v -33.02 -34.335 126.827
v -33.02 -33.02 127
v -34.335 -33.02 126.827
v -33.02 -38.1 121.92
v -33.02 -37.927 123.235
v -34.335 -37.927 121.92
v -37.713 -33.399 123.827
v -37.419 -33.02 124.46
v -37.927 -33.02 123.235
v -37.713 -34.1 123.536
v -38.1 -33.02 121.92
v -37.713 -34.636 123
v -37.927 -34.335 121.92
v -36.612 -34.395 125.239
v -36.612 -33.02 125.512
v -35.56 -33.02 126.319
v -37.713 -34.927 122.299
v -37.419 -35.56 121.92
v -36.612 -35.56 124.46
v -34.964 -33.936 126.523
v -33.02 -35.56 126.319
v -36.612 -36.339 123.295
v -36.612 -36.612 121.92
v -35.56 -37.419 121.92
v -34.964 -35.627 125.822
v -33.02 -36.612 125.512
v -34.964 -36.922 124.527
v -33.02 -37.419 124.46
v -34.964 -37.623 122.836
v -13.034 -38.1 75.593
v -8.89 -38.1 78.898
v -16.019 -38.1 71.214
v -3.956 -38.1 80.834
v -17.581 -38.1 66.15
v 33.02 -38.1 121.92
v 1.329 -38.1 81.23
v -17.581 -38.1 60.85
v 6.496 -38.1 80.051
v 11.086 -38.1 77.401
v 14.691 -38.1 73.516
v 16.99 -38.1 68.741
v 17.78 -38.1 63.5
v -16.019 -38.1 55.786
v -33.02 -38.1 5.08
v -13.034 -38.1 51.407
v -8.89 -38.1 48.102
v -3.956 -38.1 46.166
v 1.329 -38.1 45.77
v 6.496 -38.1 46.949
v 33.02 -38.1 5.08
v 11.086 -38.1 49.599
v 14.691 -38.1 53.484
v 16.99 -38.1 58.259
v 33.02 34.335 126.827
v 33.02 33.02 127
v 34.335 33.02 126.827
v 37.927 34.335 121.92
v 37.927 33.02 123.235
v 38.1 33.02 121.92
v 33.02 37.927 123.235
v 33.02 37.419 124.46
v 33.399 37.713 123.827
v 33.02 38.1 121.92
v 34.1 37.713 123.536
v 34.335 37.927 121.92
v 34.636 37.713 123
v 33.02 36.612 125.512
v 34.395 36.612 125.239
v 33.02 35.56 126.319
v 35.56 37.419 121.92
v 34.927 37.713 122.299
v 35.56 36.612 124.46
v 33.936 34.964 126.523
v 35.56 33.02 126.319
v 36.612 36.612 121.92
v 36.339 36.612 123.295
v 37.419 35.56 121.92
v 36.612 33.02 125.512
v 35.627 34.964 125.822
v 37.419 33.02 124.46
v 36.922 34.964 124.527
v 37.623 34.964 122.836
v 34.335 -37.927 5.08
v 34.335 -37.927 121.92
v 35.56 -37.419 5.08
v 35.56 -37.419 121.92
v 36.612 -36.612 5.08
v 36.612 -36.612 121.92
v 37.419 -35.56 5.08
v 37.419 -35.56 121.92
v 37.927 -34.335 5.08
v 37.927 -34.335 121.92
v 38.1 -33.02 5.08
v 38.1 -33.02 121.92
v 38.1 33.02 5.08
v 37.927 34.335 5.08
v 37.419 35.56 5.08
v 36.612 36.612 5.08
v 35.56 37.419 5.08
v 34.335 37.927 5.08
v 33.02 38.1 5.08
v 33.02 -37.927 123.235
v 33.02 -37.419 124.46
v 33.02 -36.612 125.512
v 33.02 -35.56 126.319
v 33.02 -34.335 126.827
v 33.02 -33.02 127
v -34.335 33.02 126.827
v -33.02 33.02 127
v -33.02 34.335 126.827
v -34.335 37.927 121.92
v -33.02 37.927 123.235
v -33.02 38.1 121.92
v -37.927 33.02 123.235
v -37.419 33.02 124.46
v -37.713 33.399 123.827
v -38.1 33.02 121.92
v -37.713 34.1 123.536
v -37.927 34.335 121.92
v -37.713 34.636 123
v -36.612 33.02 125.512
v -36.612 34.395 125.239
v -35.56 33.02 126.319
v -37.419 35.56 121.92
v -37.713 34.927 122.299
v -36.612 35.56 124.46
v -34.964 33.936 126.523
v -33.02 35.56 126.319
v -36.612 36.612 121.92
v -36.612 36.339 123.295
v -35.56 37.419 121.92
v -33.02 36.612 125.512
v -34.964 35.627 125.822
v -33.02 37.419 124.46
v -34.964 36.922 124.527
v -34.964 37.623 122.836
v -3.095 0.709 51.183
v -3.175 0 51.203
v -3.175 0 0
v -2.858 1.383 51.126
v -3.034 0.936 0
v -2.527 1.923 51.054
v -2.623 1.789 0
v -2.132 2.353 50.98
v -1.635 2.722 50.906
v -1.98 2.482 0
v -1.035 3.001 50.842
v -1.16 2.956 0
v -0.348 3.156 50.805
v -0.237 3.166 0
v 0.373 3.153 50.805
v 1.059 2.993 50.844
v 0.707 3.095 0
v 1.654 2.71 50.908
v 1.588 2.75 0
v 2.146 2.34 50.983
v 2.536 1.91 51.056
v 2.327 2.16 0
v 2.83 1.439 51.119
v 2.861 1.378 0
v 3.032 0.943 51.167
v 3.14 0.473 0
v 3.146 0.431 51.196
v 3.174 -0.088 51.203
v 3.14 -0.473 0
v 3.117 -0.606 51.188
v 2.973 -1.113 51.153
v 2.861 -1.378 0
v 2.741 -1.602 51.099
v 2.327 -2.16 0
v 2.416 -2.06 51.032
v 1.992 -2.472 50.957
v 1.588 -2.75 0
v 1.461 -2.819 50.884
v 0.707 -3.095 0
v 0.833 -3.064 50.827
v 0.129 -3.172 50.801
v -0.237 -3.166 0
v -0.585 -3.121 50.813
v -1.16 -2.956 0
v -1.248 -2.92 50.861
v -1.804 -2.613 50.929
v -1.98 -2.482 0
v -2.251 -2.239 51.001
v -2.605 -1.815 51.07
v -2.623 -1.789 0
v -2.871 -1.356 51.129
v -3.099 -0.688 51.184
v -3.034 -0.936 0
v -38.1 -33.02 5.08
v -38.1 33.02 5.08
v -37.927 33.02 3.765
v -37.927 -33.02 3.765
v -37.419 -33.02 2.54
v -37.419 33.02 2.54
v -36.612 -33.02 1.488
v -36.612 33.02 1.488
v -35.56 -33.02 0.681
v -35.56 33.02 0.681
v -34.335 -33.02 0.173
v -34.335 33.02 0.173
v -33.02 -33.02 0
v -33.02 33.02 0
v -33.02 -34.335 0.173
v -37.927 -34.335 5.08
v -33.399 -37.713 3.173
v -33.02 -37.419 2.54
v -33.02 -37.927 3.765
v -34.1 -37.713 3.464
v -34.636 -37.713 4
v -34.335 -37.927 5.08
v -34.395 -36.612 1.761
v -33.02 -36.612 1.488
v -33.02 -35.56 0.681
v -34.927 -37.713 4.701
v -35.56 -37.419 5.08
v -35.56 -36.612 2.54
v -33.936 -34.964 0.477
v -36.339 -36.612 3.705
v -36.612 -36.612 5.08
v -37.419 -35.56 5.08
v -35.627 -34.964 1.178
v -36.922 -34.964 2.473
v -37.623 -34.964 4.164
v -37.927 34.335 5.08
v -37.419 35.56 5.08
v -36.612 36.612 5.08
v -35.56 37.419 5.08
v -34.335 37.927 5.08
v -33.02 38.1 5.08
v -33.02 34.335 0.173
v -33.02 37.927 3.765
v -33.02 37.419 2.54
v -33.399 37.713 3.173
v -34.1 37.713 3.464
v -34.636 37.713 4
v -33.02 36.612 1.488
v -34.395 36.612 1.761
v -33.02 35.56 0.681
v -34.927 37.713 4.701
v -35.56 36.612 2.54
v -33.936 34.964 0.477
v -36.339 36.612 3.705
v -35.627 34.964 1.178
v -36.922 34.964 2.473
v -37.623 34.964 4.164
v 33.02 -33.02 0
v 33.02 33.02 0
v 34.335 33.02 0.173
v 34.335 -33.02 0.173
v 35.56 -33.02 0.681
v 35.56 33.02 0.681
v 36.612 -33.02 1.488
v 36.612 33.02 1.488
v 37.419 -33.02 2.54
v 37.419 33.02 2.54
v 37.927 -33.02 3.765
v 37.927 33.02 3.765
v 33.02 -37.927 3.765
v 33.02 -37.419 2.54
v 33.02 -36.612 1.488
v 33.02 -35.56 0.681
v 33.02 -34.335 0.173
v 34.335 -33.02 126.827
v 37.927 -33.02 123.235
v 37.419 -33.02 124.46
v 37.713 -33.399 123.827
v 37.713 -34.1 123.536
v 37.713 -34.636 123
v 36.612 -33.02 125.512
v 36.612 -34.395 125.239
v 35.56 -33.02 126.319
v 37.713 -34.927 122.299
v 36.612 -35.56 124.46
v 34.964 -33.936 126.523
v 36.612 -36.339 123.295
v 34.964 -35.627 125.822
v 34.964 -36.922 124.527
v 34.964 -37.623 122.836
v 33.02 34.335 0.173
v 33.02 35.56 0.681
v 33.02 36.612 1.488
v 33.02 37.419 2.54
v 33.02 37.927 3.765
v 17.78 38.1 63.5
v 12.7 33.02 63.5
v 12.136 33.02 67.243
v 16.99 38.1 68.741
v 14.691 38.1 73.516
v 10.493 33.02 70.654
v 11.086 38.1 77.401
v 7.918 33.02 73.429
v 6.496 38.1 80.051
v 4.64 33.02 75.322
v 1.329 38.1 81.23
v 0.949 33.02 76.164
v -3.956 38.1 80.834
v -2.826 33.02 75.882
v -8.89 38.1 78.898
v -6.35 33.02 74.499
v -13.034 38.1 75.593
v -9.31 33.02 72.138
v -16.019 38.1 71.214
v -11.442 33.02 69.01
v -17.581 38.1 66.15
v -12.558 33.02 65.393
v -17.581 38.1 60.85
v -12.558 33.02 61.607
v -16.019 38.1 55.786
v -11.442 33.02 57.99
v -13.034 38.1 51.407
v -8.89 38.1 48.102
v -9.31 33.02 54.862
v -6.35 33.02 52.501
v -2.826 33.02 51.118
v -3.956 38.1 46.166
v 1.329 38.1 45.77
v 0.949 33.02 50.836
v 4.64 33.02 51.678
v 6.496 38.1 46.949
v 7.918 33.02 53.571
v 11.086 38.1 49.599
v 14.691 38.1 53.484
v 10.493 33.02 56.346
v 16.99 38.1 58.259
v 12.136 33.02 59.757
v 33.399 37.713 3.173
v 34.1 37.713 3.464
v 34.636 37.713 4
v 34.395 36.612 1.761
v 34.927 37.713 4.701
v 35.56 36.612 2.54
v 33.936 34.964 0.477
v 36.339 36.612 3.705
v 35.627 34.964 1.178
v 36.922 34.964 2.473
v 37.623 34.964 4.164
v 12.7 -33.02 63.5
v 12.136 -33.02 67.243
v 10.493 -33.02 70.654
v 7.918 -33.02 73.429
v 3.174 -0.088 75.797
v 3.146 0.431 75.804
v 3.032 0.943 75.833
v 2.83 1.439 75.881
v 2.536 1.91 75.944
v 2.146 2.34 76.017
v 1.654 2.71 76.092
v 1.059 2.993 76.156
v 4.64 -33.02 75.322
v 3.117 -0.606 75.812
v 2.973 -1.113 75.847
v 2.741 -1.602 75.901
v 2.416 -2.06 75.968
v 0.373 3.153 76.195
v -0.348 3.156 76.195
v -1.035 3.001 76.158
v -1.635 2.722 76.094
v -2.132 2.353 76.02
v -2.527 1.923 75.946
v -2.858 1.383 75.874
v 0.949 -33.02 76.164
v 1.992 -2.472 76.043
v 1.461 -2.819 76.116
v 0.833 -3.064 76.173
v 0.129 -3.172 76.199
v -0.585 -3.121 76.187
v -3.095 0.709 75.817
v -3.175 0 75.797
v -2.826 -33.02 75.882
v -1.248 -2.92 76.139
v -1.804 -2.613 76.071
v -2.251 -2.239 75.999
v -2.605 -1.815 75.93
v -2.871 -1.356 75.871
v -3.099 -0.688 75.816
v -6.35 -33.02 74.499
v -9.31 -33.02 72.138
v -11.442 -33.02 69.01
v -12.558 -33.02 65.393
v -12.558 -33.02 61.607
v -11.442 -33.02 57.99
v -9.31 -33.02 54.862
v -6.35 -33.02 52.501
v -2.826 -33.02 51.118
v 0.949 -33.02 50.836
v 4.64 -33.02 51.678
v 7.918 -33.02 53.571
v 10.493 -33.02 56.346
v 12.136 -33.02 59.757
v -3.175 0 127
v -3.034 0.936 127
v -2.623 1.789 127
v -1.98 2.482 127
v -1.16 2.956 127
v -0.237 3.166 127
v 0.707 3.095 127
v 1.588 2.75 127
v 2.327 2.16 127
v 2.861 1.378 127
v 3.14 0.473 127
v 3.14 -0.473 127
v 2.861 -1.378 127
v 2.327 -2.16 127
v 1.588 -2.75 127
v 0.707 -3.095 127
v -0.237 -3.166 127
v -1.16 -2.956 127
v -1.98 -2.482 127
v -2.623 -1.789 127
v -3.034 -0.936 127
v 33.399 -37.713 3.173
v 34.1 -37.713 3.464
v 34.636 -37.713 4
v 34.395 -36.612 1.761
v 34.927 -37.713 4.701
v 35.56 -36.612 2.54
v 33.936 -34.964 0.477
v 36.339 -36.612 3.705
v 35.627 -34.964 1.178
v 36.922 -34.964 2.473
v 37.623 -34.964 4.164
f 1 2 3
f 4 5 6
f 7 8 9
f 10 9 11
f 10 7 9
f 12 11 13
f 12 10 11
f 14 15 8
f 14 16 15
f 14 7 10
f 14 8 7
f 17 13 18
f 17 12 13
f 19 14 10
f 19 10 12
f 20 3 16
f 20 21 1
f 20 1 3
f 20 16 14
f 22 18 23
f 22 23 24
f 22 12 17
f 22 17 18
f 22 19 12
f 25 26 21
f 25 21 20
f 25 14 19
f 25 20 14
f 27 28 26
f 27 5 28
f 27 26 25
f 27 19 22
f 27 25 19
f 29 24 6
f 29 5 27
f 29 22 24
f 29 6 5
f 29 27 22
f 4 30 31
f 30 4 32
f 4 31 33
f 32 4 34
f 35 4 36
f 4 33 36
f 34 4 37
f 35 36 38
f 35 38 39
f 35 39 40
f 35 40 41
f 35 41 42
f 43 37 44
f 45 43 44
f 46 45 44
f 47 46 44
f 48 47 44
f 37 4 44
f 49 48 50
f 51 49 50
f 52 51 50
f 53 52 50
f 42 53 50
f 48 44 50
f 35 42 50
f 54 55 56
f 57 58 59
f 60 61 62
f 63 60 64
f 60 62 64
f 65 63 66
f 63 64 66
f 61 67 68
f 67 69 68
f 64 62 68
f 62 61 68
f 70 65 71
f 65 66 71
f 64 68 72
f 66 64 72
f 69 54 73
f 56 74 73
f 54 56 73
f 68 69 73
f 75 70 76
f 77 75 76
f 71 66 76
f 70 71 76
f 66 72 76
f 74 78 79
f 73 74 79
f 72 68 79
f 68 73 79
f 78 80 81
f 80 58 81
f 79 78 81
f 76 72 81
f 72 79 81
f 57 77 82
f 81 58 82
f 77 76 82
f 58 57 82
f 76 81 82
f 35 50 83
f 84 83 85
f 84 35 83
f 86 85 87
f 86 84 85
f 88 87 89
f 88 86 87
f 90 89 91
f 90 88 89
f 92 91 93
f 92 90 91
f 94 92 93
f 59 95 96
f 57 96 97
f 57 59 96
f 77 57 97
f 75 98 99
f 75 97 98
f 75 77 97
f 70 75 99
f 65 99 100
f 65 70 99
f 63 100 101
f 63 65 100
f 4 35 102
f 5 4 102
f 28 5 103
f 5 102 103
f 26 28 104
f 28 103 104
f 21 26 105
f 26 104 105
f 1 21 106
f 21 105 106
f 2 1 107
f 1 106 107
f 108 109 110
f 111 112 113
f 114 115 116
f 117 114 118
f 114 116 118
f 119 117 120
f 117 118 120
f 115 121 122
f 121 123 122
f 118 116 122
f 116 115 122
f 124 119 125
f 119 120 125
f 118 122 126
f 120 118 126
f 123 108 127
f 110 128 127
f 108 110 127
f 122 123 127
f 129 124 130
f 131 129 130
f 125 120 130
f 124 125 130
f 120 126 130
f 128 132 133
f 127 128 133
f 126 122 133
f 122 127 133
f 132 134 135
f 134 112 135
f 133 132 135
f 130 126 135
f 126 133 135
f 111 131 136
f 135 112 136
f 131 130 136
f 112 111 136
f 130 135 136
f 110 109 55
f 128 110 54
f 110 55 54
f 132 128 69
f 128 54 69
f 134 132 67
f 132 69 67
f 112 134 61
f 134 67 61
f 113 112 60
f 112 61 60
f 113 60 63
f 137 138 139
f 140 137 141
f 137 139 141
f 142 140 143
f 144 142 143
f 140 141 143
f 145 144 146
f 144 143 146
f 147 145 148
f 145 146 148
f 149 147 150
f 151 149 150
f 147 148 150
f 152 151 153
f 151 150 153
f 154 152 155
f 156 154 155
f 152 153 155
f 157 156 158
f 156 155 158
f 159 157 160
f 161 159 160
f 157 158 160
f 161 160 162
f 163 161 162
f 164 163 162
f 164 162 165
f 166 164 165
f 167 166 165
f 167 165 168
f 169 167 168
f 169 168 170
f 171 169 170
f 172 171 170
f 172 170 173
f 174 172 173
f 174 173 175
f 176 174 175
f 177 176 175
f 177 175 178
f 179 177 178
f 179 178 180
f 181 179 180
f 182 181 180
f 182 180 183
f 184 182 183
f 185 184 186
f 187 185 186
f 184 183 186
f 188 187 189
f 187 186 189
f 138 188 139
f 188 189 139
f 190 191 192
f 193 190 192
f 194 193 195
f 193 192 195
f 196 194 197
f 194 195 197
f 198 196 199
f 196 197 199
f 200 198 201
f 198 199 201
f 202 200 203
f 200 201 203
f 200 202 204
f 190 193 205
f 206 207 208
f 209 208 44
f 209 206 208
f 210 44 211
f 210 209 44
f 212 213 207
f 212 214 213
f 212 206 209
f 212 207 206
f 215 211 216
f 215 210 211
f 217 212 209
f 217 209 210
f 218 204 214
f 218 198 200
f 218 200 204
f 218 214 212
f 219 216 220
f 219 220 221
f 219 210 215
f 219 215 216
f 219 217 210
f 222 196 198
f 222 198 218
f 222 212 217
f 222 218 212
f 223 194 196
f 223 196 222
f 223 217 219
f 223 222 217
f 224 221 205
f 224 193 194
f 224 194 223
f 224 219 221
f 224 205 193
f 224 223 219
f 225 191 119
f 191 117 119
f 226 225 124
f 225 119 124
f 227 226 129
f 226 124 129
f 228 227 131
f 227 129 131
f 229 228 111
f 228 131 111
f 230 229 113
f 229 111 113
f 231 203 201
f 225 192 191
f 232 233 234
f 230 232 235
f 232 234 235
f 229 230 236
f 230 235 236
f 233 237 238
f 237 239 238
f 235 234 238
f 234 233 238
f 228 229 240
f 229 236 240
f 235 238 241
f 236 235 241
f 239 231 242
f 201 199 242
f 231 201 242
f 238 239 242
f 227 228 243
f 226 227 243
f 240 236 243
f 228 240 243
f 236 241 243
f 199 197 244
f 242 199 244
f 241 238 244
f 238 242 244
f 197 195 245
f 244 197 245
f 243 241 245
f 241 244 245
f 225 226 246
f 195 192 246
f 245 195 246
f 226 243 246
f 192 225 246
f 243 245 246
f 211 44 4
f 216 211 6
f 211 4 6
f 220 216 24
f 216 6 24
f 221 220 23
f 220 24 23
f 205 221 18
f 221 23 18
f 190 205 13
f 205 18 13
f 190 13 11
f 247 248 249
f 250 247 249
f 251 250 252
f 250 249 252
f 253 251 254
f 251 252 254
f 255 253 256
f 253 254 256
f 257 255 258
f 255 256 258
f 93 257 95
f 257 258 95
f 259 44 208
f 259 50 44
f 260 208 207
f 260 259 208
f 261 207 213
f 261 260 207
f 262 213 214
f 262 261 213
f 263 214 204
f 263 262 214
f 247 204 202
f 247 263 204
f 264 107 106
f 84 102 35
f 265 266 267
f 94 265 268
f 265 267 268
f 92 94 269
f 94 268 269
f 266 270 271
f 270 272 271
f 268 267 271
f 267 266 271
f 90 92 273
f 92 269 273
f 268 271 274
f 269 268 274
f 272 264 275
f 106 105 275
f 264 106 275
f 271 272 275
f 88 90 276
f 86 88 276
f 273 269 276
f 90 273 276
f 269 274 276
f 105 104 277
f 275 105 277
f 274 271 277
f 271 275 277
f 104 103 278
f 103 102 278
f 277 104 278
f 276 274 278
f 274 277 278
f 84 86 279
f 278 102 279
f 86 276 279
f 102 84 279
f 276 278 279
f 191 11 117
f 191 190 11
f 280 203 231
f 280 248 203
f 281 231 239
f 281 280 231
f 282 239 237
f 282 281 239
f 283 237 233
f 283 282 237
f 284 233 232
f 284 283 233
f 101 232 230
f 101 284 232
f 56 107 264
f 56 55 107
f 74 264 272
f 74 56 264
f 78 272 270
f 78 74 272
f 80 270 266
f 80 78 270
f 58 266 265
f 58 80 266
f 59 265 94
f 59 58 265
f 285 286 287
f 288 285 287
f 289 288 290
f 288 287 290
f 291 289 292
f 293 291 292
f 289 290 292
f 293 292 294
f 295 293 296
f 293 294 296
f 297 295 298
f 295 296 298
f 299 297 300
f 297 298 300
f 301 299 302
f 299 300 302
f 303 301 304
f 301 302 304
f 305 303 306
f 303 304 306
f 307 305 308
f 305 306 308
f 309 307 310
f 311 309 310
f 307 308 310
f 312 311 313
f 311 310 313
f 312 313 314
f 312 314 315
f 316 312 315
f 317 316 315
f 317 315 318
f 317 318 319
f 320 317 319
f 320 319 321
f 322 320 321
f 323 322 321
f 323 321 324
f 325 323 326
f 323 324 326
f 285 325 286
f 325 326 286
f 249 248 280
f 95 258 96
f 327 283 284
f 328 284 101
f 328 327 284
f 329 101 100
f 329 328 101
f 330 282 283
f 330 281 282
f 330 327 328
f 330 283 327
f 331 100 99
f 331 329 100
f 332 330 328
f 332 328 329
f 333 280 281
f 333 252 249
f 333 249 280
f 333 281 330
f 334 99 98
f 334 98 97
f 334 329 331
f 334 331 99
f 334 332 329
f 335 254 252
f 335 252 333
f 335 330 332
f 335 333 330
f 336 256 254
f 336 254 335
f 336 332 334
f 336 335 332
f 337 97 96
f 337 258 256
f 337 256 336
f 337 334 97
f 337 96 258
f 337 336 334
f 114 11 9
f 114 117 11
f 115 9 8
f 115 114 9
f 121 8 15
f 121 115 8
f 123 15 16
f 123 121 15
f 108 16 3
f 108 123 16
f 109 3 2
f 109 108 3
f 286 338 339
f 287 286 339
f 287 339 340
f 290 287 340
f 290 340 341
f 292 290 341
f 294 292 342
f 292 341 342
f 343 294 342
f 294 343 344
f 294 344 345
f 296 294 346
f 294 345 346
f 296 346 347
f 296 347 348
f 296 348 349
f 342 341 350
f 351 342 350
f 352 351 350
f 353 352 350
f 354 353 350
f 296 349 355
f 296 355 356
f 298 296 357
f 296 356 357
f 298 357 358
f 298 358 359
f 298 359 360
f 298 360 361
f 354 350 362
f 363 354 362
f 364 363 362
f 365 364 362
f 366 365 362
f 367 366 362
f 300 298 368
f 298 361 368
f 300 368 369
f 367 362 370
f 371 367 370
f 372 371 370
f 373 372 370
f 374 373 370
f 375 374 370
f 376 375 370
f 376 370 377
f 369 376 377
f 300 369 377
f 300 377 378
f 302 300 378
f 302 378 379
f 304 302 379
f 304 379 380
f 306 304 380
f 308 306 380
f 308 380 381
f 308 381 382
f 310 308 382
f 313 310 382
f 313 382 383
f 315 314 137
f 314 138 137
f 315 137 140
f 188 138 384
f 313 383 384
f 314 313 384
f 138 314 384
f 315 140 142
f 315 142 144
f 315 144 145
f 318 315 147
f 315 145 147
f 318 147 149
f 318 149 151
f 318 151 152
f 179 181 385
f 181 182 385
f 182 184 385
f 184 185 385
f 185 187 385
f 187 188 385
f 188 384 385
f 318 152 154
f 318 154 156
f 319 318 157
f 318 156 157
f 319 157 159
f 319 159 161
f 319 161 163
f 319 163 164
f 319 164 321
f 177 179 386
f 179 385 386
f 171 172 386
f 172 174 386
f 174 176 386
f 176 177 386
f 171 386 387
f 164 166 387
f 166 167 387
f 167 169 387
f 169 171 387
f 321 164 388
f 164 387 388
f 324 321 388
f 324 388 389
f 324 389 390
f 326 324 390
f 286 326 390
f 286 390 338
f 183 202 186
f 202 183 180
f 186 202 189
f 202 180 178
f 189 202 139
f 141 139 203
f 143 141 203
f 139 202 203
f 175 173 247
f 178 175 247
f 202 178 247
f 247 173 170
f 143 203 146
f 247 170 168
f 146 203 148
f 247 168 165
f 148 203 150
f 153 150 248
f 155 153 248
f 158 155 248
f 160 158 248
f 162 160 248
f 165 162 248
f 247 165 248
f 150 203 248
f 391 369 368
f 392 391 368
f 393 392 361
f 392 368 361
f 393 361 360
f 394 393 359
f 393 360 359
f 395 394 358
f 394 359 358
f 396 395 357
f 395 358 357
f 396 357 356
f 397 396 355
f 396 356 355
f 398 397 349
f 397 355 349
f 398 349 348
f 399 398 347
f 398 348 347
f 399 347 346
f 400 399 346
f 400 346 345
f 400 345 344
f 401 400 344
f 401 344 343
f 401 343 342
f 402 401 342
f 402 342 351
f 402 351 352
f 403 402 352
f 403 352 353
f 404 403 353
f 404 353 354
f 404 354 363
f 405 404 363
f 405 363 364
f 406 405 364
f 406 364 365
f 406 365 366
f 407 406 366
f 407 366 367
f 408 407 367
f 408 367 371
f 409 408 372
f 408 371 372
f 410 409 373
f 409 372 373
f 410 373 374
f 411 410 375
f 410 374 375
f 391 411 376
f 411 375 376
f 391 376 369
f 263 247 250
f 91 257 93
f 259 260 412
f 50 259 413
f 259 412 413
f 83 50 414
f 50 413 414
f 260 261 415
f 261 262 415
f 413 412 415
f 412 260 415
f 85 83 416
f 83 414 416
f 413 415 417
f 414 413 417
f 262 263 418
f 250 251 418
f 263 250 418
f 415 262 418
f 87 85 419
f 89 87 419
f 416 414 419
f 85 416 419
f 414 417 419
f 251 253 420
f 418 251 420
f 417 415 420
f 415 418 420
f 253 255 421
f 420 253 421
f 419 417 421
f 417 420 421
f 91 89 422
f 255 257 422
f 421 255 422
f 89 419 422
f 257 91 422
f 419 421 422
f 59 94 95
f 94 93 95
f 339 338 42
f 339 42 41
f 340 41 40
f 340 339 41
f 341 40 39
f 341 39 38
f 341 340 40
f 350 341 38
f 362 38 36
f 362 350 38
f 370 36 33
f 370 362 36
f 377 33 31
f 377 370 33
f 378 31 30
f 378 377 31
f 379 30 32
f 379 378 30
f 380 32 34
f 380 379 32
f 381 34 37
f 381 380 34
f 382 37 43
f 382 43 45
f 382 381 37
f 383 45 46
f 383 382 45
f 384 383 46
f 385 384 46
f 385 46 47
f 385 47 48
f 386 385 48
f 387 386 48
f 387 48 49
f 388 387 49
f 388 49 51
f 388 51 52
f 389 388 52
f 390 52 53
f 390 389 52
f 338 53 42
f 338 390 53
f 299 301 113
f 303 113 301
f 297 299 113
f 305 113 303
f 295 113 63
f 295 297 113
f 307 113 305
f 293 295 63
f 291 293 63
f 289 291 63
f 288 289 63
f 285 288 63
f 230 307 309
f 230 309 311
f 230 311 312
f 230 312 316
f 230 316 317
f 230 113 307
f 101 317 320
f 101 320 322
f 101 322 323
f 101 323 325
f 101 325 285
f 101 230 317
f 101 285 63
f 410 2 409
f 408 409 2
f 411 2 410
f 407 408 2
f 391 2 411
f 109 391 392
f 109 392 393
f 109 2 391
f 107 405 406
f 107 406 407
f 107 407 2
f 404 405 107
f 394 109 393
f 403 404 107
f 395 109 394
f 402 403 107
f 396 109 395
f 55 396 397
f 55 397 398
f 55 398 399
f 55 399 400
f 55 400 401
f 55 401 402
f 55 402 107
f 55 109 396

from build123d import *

# Parameters (mm, degrees)
F0_W     = 76.2
F0_H     = 76.2
F1_DEPTH = 127
F2_R     = 12.7
F3_DEPTH = 76.201
F4_SIZE  = 5.08
F5_R     = 5.08
F7_D     = 6.35


with BuildPart() as f1:
    # F0 (on Top) → F1 (new body)
    with BuildSketch(Plane.XY):
        Rectangle(F0_W, F0_H)
    extrude(amount=F1_DEPTH)

    # F2 (on face) → F3 (cut, through all)
    with BuildSketch(Plane.XZ.offset(38.1)):
        with Locations((0, 63.5)):
            Circle(F2_R)
    extrude(amount=-F3_DEPTH, mode=Mode.SUBTRACT)

    # F4
    f4_edges = [f1.edges().sort_by_distance(p)[0] for p in [
        (-12.7, -38.1, 63.5),
        (-12.7, 38.1, 63.5),
    ]]
    chamfer(f4_edges, length=F4_SIZE)

    # F5
    f5_edges = [f1.edges().sort_by_distance(p)[0] for p in [
        (0, -38.1, 127),
        (38.1, 0, 127),
        (0, 38.1, 127),
        (-38.1, 0, 127),
        (-38.1, 0, 0),
        (38.1, 0, 0),
        (0, 38.1, 0),
        (0, -38.1, 0),
        (38.1, -38.1, 63.5),
        (38.1, 38.1, 63.5),
        (-38.1, 38.1, 63.5),
        (-38.1, -38.1, 63.5),
    ]]
    fillet(f5_edges, radius=F5_R)

    # F7 (through all)
    with Locations(Plane.XY.offset(127)):
        with Locations((0, 0)):
            Hole(F7_D / 2)


solid = f1.part
